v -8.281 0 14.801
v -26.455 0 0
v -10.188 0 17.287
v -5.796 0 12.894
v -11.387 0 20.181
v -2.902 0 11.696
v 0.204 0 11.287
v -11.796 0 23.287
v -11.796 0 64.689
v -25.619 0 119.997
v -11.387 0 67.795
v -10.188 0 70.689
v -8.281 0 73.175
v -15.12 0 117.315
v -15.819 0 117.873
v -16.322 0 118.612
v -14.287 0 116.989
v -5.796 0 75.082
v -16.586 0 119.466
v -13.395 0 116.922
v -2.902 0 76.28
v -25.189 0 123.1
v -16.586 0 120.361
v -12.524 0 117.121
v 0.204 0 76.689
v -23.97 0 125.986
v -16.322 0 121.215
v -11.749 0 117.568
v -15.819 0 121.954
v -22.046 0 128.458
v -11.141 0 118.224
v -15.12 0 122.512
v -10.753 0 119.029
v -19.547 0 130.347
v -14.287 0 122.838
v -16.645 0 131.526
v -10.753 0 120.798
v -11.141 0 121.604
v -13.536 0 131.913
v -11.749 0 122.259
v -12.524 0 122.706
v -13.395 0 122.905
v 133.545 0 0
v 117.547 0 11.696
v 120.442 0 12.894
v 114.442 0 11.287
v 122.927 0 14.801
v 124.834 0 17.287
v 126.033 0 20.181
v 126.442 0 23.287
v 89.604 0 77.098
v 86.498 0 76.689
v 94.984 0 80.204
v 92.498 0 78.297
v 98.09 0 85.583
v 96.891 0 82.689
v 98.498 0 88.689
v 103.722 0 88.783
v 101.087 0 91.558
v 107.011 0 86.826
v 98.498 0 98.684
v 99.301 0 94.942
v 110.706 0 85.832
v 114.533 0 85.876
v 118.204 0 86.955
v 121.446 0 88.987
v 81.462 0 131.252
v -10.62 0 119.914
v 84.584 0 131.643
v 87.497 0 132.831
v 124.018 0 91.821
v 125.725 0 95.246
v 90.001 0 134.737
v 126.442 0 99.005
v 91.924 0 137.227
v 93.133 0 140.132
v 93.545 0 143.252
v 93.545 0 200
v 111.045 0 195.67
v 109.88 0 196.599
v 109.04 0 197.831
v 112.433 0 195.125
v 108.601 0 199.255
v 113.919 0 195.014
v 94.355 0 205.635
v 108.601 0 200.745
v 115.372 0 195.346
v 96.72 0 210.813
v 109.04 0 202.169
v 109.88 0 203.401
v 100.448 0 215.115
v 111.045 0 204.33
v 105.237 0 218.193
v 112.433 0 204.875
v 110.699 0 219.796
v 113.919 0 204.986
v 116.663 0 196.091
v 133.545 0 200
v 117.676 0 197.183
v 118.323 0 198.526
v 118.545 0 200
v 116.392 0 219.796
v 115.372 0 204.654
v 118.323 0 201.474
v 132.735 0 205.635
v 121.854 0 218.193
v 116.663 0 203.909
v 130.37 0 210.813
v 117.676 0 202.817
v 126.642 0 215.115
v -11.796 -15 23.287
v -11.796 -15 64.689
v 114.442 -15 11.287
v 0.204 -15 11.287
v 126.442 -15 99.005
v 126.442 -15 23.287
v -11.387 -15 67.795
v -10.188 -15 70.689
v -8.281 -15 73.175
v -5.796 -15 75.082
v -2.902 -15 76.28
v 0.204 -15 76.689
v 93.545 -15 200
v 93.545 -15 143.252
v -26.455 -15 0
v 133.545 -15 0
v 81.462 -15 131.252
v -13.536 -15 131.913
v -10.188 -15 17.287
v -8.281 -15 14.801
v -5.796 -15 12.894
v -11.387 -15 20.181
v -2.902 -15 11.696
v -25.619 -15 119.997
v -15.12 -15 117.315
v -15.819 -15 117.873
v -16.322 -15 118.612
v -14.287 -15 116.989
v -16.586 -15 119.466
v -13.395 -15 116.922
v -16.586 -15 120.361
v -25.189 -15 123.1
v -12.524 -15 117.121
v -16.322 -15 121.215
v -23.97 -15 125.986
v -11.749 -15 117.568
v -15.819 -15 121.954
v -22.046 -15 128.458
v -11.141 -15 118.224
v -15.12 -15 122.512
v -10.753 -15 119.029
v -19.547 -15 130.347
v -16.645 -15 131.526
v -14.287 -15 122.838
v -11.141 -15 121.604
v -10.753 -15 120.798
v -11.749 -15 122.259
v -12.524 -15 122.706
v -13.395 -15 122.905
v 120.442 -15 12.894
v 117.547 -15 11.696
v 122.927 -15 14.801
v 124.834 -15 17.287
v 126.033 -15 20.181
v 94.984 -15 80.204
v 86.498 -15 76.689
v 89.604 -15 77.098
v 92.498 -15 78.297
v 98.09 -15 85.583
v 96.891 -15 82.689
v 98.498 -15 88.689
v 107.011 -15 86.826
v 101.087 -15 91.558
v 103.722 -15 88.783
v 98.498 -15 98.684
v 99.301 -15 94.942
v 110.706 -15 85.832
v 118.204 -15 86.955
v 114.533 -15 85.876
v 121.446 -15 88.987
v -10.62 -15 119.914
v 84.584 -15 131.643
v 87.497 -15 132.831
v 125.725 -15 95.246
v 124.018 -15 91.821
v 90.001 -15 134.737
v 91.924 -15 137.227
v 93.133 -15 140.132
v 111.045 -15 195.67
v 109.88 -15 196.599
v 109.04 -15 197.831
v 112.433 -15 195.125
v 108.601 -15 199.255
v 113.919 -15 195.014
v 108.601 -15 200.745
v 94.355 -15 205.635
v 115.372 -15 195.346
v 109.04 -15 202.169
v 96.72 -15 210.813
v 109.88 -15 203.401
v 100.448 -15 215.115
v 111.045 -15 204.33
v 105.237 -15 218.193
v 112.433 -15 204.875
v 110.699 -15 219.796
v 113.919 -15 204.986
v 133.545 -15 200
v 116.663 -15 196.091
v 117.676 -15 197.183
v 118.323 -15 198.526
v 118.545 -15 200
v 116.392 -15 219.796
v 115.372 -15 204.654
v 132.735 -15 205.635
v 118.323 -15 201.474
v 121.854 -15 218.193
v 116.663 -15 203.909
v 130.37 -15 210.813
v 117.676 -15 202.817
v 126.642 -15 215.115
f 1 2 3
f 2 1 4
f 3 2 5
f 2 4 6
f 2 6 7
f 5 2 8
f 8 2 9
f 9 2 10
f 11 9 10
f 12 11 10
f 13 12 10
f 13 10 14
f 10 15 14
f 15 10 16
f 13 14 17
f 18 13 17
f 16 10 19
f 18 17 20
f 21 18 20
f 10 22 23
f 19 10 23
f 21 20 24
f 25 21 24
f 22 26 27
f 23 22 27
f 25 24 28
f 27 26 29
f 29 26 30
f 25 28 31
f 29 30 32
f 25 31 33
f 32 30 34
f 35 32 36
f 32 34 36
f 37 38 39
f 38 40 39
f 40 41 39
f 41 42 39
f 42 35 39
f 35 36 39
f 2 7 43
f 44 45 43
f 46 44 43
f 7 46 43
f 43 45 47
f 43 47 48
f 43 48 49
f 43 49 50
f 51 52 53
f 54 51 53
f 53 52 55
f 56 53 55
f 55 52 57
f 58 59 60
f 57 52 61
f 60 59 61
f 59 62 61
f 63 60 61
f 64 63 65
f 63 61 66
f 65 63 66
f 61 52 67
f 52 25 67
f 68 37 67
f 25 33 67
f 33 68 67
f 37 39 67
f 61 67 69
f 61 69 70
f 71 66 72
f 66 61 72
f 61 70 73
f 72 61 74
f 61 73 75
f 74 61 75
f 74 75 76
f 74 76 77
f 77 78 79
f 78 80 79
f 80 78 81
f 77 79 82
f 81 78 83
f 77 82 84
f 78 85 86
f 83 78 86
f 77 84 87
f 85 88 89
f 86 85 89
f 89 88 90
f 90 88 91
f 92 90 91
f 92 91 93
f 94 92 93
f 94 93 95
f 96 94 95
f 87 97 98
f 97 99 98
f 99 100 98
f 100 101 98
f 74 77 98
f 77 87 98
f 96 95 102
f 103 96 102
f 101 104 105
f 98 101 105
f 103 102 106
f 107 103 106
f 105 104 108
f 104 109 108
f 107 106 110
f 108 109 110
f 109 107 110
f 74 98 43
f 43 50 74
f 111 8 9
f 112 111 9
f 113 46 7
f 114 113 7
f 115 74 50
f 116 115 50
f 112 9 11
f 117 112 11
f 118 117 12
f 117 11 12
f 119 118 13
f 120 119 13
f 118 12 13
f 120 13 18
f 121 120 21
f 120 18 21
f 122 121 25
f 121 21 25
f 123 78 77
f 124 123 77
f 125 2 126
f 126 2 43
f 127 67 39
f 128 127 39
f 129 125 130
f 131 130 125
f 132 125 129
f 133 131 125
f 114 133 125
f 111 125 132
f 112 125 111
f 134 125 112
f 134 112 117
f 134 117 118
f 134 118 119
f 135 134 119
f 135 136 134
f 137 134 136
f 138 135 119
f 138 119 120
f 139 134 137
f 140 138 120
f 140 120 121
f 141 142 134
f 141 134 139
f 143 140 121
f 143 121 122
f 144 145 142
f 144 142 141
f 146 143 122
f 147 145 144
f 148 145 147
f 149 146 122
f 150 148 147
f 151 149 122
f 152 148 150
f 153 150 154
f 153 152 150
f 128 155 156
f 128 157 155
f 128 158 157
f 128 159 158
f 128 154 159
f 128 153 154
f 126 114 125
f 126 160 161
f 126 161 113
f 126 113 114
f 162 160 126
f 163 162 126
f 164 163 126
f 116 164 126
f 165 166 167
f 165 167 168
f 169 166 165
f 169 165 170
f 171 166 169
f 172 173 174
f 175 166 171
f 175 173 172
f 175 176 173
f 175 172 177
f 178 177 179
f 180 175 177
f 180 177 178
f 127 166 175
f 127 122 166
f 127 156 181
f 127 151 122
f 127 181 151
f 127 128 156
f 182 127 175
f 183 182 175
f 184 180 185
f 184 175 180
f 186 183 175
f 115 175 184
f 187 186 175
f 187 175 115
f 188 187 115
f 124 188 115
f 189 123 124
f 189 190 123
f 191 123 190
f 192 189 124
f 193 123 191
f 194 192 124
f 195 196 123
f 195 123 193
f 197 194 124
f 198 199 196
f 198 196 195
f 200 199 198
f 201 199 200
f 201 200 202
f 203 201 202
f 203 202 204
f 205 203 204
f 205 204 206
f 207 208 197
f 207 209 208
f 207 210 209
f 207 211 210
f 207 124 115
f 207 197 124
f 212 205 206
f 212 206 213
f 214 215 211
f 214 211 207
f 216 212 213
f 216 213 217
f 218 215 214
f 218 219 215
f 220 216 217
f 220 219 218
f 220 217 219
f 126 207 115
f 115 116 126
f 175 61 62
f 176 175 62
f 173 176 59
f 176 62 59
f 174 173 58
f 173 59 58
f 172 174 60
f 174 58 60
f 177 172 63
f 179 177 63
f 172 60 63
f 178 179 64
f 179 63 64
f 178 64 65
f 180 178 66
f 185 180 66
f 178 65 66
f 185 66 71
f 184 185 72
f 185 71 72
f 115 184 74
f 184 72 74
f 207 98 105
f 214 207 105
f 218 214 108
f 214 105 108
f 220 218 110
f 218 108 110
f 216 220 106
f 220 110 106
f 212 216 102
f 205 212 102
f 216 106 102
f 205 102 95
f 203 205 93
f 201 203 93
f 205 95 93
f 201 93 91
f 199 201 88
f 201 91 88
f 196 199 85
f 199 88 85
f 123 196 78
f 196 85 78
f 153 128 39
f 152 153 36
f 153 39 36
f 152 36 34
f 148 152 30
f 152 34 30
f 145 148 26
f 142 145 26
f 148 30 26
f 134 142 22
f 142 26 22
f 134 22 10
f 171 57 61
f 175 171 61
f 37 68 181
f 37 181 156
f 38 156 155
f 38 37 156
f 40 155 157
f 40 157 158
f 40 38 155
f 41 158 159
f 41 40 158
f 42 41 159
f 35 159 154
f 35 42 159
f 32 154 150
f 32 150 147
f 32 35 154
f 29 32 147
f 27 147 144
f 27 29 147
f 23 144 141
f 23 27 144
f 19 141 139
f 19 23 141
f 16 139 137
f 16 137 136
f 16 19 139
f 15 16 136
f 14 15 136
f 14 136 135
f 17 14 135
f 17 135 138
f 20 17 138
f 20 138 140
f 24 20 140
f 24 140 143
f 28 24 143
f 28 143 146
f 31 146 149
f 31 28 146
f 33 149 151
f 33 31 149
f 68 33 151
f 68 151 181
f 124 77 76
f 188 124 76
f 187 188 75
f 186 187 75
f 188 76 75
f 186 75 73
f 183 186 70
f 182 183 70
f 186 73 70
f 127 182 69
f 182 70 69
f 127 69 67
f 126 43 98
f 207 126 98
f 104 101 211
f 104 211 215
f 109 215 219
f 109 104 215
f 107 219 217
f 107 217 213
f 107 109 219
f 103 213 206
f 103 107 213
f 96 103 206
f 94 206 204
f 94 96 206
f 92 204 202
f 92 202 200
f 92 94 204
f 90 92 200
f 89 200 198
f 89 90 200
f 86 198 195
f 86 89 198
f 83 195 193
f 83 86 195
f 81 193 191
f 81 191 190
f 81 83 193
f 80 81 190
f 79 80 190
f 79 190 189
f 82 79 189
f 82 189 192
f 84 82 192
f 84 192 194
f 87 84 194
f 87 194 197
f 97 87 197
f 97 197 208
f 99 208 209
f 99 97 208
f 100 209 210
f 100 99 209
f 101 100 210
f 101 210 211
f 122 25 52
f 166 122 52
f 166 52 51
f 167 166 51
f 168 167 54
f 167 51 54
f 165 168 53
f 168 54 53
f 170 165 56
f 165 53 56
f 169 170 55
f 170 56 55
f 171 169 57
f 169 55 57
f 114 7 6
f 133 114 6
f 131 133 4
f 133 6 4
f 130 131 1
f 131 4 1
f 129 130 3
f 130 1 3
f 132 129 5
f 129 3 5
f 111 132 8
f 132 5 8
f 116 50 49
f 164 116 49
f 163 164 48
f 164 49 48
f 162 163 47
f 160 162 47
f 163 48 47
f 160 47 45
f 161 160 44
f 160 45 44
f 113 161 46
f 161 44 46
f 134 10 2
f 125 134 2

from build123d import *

# Parameters (mm, degrees)
F0_R     = 3
F0_R_2   = 5
F1_DEPTH = 15


with BuildPart() as f1:
    # F0 (on Front) → F1 (new body)
    with BuildSketch(Plane.XZ):
        with BuildLine():
            Line((-25.619237, 119.997091), (-26.454732, 0))
            Line((-26.454732, 0), (133.545268, 0))
            Line((133.545268, 0), (133.545268, 200))
            ThreePointArc((133.545268, 200), (113.545268, 220), (93.545268, 200))
            Line((93.545268, 200), (93.545268, 143.251527))
            ThreePointArc((93.545268, 143.251527), (90.000959, 134.736758), (81.461719, 131.251818))
            Line((81.461719, 131.251818), (-13.535978, 131.913251))
            ThreePointArc((-13.535978, 131.913251), (-22.045525, 128.457696), (-25.619237, 119.997091))
        make_face()
        with BuildLine():
            Line((98.498465, 88.689308), (98.498465, 98.683833))
            ThreePointArc((98.498465, 98.683833), (112.620812, 85.723137), (126.441521, 99.005017))
            Line((126.441521, 99.005017), (126.441521, 23.286659))
            ThreePointArc((126.441521, 23.286659), (122.926803, 14.801378), (114.441521, 11.286659))
            Line((114.441521, 11.286659), (0.203851, 11.286659))
            ThreePointArc((0.203851, 11.286659), (-8.281431, 14.801378), (-11.796149, 23.286659))
            Line((-11.796149, 23.286659), (-11.796149, 64.689308))
            ThreePointArc((-11.796149, 64.689308), (-8.281431, 73.174589), (0.203851, 76.689308))
            Line((0.203851, 76.689308), (86.498465, 76.689308))
            ThreePointArc((86.498465, 76.689308), (94.983746, 80.204026), (98.498465, 88.689308))
        make_face(mode=Mode.SUBTRACT)
        with Locations((-13.619528, 119.913542)):
            Circle(F0_R, mode=Mode.SUBTRACT)
        with Locations((113.545268, 200)):
            Circle(F0_R_2, mode=Mode.SUBTRACT)
    extrude(amount=F1_DEPTH)


solid = f1.part
